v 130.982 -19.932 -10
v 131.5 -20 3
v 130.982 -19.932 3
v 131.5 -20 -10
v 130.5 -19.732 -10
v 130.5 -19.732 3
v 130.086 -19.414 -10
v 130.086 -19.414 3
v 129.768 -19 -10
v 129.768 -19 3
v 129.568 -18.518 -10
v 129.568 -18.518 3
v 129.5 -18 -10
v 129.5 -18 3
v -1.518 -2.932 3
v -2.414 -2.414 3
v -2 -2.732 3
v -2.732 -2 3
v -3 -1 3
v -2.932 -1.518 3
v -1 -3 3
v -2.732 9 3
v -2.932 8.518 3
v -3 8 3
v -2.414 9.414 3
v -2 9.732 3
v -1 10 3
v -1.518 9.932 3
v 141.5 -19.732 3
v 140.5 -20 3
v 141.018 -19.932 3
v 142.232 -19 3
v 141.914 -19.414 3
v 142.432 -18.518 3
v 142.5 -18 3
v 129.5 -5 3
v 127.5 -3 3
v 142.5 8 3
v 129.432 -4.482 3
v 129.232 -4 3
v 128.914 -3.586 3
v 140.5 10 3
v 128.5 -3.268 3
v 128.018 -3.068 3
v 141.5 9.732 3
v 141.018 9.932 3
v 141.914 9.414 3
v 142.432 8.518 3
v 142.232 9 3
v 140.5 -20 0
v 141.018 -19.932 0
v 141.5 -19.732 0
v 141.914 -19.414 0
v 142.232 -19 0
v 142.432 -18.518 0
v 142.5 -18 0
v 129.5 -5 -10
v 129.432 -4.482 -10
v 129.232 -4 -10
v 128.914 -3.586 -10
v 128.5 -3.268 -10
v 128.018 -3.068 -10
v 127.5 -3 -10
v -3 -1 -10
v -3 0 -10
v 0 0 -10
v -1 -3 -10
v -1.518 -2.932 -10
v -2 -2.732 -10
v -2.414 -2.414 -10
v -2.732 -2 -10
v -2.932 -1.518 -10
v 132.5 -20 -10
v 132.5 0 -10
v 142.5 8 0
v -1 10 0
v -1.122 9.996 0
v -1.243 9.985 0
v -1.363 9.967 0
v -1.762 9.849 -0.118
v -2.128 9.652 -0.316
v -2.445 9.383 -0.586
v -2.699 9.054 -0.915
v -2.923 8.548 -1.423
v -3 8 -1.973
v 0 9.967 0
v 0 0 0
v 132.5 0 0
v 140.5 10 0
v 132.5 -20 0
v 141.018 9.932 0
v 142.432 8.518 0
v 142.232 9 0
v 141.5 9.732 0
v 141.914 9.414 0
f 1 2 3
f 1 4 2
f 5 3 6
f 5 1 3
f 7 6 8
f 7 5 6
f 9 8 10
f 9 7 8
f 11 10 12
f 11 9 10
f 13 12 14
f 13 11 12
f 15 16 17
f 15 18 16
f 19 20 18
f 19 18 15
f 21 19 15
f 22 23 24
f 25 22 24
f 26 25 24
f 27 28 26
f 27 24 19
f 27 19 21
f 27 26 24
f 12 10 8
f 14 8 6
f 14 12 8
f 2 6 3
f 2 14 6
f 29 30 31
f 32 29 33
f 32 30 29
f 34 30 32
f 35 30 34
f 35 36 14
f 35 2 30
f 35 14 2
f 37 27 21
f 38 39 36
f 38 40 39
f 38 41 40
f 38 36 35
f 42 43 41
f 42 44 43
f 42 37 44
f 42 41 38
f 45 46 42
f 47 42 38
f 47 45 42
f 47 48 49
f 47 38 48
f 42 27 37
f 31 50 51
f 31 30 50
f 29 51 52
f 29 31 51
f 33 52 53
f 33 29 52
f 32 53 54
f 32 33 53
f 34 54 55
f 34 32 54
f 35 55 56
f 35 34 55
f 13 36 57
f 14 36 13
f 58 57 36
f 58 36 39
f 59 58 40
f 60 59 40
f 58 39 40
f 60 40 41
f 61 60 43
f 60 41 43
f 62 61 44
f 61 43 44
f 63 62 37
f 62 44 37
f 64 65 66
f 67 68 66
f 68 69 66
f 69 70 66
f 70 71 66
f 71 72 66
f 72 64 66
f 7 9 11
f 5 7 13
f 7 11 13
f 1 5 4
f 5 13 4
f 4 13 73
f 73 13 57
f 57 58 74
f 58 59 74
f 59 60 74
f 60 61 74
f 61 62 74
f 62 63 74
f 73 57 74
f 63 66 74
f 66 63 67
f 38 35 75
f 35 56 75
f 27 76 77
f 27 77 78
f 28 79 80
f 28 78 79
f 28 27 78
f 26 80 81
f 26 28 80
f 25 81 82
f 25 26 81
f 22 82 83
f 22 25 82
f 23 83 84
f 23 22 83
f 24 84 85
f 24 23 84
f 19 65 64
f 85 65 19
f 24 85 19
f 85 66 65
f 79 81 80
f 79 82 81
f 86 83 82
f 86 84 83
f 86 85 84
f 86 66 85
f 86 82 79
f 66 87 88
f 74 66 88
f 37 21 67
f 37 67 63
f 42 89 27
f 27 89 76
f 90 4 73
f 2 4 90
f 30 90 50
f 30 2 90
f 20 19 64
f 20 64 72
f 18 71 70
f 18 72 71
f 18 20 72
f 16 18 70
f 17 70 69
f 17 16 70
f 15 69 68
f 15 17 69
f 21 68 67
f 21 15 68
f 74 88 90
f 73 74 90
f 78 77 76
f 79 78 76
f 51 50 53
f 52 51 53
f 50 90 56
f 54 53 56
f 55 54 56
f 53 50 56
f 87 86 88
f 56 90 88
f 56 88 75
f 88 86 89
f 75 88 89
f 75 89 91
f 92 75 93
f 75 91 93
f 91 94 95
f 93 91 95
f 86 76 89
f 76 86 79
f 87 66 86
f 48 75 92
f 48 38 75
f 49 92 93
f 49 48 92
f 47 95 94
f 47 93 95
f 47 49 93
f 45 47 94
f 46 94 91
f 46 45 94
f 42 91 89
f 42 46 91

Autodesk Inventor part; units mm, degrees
ref_plane "YZ Plane" through (0, 0, 0) normal (1, 0, 0) x (0, 1, 0)
ref_plane "XZ Plane" through (0, 0, 0) normal (0, 1, 0) x (-1, 0, 0)
ref_plane "XY Plane" through (0, 0, 0) normal (0, 0, 1) x (1, 0, 0)
sketch "Sketch1" plane through (0, 0, 0) normal (0, 0, 1) x (1, 0, 0)
  line L0 (0, 0) -> (132.5, 0)
  line L1 (132.5, 0) -> (132.5, 10)
  line L2 (132.5, 10) -> (0, 10)
  line L3 (0, 10) -> (0, 0)
  line L4 (132.5, 0) -> (132.5, -20)
  line L5 (132.5, -20) -> (142.5, -20)
  line L6 (142.5, -20) -> (142.5, 10)
  line L7 (142.5, 10) -> (132.5, 10)
  line L8 (0, 0) -> (0, -3)
  line L9 (0, -3) -> (129.5, -3)
  line L10 (129.5, -3) -> (129.5, -20)
  line L11 (129.5, -20) -> (132.5, -20)
  dimension "d0" = 132.5
  dimension "d1" = 10
  dimension "d2" = 10
  dimension "d3" = 20
  dimension "d4" = 3
  dimension "d5" = 3
extrude "Extrusion1" add sketch "Sketch1" along normal blind 3
extrude "Extrusion2" add sketch "Sketch1" against normal blind 10 contours L0 L4 L11 L10 L9 L8
sketch "Sketch2" plane through (0, -3, 3) normal (-1, 0, 0) x (0, 0, 1)
  line L0 (-13, 3) -> (-13, -17) projected
  line L1 (-13, 3) -> (-3, 12.9668)
  line L2 (-3, 13) -> (-3, 3) projected
  line L3 (-3, 3) -> (-13, 3) projected
  line L4 (-13, 0) -> (-13, 3) projected
  line L5 (-13, 0) -> (0, 0) projected
  line L6 (0, 13) -> (0, 0) projected
  line L7 (-3, 13) -> (0, 13) projected
extrude "Extrusion3" add sketch "Sketch2" along normal blind 3
fillet "Fillet2" radius 2 6 edges at (142.5, 10, 1.5) (142.5, -20, 1.5) (129.5, -20, -3.5) (129.5, -3, -3.5) (-3, 10, 1.5) (-3, -3, -3.5)
properties part number "Z Alignment Guide"
